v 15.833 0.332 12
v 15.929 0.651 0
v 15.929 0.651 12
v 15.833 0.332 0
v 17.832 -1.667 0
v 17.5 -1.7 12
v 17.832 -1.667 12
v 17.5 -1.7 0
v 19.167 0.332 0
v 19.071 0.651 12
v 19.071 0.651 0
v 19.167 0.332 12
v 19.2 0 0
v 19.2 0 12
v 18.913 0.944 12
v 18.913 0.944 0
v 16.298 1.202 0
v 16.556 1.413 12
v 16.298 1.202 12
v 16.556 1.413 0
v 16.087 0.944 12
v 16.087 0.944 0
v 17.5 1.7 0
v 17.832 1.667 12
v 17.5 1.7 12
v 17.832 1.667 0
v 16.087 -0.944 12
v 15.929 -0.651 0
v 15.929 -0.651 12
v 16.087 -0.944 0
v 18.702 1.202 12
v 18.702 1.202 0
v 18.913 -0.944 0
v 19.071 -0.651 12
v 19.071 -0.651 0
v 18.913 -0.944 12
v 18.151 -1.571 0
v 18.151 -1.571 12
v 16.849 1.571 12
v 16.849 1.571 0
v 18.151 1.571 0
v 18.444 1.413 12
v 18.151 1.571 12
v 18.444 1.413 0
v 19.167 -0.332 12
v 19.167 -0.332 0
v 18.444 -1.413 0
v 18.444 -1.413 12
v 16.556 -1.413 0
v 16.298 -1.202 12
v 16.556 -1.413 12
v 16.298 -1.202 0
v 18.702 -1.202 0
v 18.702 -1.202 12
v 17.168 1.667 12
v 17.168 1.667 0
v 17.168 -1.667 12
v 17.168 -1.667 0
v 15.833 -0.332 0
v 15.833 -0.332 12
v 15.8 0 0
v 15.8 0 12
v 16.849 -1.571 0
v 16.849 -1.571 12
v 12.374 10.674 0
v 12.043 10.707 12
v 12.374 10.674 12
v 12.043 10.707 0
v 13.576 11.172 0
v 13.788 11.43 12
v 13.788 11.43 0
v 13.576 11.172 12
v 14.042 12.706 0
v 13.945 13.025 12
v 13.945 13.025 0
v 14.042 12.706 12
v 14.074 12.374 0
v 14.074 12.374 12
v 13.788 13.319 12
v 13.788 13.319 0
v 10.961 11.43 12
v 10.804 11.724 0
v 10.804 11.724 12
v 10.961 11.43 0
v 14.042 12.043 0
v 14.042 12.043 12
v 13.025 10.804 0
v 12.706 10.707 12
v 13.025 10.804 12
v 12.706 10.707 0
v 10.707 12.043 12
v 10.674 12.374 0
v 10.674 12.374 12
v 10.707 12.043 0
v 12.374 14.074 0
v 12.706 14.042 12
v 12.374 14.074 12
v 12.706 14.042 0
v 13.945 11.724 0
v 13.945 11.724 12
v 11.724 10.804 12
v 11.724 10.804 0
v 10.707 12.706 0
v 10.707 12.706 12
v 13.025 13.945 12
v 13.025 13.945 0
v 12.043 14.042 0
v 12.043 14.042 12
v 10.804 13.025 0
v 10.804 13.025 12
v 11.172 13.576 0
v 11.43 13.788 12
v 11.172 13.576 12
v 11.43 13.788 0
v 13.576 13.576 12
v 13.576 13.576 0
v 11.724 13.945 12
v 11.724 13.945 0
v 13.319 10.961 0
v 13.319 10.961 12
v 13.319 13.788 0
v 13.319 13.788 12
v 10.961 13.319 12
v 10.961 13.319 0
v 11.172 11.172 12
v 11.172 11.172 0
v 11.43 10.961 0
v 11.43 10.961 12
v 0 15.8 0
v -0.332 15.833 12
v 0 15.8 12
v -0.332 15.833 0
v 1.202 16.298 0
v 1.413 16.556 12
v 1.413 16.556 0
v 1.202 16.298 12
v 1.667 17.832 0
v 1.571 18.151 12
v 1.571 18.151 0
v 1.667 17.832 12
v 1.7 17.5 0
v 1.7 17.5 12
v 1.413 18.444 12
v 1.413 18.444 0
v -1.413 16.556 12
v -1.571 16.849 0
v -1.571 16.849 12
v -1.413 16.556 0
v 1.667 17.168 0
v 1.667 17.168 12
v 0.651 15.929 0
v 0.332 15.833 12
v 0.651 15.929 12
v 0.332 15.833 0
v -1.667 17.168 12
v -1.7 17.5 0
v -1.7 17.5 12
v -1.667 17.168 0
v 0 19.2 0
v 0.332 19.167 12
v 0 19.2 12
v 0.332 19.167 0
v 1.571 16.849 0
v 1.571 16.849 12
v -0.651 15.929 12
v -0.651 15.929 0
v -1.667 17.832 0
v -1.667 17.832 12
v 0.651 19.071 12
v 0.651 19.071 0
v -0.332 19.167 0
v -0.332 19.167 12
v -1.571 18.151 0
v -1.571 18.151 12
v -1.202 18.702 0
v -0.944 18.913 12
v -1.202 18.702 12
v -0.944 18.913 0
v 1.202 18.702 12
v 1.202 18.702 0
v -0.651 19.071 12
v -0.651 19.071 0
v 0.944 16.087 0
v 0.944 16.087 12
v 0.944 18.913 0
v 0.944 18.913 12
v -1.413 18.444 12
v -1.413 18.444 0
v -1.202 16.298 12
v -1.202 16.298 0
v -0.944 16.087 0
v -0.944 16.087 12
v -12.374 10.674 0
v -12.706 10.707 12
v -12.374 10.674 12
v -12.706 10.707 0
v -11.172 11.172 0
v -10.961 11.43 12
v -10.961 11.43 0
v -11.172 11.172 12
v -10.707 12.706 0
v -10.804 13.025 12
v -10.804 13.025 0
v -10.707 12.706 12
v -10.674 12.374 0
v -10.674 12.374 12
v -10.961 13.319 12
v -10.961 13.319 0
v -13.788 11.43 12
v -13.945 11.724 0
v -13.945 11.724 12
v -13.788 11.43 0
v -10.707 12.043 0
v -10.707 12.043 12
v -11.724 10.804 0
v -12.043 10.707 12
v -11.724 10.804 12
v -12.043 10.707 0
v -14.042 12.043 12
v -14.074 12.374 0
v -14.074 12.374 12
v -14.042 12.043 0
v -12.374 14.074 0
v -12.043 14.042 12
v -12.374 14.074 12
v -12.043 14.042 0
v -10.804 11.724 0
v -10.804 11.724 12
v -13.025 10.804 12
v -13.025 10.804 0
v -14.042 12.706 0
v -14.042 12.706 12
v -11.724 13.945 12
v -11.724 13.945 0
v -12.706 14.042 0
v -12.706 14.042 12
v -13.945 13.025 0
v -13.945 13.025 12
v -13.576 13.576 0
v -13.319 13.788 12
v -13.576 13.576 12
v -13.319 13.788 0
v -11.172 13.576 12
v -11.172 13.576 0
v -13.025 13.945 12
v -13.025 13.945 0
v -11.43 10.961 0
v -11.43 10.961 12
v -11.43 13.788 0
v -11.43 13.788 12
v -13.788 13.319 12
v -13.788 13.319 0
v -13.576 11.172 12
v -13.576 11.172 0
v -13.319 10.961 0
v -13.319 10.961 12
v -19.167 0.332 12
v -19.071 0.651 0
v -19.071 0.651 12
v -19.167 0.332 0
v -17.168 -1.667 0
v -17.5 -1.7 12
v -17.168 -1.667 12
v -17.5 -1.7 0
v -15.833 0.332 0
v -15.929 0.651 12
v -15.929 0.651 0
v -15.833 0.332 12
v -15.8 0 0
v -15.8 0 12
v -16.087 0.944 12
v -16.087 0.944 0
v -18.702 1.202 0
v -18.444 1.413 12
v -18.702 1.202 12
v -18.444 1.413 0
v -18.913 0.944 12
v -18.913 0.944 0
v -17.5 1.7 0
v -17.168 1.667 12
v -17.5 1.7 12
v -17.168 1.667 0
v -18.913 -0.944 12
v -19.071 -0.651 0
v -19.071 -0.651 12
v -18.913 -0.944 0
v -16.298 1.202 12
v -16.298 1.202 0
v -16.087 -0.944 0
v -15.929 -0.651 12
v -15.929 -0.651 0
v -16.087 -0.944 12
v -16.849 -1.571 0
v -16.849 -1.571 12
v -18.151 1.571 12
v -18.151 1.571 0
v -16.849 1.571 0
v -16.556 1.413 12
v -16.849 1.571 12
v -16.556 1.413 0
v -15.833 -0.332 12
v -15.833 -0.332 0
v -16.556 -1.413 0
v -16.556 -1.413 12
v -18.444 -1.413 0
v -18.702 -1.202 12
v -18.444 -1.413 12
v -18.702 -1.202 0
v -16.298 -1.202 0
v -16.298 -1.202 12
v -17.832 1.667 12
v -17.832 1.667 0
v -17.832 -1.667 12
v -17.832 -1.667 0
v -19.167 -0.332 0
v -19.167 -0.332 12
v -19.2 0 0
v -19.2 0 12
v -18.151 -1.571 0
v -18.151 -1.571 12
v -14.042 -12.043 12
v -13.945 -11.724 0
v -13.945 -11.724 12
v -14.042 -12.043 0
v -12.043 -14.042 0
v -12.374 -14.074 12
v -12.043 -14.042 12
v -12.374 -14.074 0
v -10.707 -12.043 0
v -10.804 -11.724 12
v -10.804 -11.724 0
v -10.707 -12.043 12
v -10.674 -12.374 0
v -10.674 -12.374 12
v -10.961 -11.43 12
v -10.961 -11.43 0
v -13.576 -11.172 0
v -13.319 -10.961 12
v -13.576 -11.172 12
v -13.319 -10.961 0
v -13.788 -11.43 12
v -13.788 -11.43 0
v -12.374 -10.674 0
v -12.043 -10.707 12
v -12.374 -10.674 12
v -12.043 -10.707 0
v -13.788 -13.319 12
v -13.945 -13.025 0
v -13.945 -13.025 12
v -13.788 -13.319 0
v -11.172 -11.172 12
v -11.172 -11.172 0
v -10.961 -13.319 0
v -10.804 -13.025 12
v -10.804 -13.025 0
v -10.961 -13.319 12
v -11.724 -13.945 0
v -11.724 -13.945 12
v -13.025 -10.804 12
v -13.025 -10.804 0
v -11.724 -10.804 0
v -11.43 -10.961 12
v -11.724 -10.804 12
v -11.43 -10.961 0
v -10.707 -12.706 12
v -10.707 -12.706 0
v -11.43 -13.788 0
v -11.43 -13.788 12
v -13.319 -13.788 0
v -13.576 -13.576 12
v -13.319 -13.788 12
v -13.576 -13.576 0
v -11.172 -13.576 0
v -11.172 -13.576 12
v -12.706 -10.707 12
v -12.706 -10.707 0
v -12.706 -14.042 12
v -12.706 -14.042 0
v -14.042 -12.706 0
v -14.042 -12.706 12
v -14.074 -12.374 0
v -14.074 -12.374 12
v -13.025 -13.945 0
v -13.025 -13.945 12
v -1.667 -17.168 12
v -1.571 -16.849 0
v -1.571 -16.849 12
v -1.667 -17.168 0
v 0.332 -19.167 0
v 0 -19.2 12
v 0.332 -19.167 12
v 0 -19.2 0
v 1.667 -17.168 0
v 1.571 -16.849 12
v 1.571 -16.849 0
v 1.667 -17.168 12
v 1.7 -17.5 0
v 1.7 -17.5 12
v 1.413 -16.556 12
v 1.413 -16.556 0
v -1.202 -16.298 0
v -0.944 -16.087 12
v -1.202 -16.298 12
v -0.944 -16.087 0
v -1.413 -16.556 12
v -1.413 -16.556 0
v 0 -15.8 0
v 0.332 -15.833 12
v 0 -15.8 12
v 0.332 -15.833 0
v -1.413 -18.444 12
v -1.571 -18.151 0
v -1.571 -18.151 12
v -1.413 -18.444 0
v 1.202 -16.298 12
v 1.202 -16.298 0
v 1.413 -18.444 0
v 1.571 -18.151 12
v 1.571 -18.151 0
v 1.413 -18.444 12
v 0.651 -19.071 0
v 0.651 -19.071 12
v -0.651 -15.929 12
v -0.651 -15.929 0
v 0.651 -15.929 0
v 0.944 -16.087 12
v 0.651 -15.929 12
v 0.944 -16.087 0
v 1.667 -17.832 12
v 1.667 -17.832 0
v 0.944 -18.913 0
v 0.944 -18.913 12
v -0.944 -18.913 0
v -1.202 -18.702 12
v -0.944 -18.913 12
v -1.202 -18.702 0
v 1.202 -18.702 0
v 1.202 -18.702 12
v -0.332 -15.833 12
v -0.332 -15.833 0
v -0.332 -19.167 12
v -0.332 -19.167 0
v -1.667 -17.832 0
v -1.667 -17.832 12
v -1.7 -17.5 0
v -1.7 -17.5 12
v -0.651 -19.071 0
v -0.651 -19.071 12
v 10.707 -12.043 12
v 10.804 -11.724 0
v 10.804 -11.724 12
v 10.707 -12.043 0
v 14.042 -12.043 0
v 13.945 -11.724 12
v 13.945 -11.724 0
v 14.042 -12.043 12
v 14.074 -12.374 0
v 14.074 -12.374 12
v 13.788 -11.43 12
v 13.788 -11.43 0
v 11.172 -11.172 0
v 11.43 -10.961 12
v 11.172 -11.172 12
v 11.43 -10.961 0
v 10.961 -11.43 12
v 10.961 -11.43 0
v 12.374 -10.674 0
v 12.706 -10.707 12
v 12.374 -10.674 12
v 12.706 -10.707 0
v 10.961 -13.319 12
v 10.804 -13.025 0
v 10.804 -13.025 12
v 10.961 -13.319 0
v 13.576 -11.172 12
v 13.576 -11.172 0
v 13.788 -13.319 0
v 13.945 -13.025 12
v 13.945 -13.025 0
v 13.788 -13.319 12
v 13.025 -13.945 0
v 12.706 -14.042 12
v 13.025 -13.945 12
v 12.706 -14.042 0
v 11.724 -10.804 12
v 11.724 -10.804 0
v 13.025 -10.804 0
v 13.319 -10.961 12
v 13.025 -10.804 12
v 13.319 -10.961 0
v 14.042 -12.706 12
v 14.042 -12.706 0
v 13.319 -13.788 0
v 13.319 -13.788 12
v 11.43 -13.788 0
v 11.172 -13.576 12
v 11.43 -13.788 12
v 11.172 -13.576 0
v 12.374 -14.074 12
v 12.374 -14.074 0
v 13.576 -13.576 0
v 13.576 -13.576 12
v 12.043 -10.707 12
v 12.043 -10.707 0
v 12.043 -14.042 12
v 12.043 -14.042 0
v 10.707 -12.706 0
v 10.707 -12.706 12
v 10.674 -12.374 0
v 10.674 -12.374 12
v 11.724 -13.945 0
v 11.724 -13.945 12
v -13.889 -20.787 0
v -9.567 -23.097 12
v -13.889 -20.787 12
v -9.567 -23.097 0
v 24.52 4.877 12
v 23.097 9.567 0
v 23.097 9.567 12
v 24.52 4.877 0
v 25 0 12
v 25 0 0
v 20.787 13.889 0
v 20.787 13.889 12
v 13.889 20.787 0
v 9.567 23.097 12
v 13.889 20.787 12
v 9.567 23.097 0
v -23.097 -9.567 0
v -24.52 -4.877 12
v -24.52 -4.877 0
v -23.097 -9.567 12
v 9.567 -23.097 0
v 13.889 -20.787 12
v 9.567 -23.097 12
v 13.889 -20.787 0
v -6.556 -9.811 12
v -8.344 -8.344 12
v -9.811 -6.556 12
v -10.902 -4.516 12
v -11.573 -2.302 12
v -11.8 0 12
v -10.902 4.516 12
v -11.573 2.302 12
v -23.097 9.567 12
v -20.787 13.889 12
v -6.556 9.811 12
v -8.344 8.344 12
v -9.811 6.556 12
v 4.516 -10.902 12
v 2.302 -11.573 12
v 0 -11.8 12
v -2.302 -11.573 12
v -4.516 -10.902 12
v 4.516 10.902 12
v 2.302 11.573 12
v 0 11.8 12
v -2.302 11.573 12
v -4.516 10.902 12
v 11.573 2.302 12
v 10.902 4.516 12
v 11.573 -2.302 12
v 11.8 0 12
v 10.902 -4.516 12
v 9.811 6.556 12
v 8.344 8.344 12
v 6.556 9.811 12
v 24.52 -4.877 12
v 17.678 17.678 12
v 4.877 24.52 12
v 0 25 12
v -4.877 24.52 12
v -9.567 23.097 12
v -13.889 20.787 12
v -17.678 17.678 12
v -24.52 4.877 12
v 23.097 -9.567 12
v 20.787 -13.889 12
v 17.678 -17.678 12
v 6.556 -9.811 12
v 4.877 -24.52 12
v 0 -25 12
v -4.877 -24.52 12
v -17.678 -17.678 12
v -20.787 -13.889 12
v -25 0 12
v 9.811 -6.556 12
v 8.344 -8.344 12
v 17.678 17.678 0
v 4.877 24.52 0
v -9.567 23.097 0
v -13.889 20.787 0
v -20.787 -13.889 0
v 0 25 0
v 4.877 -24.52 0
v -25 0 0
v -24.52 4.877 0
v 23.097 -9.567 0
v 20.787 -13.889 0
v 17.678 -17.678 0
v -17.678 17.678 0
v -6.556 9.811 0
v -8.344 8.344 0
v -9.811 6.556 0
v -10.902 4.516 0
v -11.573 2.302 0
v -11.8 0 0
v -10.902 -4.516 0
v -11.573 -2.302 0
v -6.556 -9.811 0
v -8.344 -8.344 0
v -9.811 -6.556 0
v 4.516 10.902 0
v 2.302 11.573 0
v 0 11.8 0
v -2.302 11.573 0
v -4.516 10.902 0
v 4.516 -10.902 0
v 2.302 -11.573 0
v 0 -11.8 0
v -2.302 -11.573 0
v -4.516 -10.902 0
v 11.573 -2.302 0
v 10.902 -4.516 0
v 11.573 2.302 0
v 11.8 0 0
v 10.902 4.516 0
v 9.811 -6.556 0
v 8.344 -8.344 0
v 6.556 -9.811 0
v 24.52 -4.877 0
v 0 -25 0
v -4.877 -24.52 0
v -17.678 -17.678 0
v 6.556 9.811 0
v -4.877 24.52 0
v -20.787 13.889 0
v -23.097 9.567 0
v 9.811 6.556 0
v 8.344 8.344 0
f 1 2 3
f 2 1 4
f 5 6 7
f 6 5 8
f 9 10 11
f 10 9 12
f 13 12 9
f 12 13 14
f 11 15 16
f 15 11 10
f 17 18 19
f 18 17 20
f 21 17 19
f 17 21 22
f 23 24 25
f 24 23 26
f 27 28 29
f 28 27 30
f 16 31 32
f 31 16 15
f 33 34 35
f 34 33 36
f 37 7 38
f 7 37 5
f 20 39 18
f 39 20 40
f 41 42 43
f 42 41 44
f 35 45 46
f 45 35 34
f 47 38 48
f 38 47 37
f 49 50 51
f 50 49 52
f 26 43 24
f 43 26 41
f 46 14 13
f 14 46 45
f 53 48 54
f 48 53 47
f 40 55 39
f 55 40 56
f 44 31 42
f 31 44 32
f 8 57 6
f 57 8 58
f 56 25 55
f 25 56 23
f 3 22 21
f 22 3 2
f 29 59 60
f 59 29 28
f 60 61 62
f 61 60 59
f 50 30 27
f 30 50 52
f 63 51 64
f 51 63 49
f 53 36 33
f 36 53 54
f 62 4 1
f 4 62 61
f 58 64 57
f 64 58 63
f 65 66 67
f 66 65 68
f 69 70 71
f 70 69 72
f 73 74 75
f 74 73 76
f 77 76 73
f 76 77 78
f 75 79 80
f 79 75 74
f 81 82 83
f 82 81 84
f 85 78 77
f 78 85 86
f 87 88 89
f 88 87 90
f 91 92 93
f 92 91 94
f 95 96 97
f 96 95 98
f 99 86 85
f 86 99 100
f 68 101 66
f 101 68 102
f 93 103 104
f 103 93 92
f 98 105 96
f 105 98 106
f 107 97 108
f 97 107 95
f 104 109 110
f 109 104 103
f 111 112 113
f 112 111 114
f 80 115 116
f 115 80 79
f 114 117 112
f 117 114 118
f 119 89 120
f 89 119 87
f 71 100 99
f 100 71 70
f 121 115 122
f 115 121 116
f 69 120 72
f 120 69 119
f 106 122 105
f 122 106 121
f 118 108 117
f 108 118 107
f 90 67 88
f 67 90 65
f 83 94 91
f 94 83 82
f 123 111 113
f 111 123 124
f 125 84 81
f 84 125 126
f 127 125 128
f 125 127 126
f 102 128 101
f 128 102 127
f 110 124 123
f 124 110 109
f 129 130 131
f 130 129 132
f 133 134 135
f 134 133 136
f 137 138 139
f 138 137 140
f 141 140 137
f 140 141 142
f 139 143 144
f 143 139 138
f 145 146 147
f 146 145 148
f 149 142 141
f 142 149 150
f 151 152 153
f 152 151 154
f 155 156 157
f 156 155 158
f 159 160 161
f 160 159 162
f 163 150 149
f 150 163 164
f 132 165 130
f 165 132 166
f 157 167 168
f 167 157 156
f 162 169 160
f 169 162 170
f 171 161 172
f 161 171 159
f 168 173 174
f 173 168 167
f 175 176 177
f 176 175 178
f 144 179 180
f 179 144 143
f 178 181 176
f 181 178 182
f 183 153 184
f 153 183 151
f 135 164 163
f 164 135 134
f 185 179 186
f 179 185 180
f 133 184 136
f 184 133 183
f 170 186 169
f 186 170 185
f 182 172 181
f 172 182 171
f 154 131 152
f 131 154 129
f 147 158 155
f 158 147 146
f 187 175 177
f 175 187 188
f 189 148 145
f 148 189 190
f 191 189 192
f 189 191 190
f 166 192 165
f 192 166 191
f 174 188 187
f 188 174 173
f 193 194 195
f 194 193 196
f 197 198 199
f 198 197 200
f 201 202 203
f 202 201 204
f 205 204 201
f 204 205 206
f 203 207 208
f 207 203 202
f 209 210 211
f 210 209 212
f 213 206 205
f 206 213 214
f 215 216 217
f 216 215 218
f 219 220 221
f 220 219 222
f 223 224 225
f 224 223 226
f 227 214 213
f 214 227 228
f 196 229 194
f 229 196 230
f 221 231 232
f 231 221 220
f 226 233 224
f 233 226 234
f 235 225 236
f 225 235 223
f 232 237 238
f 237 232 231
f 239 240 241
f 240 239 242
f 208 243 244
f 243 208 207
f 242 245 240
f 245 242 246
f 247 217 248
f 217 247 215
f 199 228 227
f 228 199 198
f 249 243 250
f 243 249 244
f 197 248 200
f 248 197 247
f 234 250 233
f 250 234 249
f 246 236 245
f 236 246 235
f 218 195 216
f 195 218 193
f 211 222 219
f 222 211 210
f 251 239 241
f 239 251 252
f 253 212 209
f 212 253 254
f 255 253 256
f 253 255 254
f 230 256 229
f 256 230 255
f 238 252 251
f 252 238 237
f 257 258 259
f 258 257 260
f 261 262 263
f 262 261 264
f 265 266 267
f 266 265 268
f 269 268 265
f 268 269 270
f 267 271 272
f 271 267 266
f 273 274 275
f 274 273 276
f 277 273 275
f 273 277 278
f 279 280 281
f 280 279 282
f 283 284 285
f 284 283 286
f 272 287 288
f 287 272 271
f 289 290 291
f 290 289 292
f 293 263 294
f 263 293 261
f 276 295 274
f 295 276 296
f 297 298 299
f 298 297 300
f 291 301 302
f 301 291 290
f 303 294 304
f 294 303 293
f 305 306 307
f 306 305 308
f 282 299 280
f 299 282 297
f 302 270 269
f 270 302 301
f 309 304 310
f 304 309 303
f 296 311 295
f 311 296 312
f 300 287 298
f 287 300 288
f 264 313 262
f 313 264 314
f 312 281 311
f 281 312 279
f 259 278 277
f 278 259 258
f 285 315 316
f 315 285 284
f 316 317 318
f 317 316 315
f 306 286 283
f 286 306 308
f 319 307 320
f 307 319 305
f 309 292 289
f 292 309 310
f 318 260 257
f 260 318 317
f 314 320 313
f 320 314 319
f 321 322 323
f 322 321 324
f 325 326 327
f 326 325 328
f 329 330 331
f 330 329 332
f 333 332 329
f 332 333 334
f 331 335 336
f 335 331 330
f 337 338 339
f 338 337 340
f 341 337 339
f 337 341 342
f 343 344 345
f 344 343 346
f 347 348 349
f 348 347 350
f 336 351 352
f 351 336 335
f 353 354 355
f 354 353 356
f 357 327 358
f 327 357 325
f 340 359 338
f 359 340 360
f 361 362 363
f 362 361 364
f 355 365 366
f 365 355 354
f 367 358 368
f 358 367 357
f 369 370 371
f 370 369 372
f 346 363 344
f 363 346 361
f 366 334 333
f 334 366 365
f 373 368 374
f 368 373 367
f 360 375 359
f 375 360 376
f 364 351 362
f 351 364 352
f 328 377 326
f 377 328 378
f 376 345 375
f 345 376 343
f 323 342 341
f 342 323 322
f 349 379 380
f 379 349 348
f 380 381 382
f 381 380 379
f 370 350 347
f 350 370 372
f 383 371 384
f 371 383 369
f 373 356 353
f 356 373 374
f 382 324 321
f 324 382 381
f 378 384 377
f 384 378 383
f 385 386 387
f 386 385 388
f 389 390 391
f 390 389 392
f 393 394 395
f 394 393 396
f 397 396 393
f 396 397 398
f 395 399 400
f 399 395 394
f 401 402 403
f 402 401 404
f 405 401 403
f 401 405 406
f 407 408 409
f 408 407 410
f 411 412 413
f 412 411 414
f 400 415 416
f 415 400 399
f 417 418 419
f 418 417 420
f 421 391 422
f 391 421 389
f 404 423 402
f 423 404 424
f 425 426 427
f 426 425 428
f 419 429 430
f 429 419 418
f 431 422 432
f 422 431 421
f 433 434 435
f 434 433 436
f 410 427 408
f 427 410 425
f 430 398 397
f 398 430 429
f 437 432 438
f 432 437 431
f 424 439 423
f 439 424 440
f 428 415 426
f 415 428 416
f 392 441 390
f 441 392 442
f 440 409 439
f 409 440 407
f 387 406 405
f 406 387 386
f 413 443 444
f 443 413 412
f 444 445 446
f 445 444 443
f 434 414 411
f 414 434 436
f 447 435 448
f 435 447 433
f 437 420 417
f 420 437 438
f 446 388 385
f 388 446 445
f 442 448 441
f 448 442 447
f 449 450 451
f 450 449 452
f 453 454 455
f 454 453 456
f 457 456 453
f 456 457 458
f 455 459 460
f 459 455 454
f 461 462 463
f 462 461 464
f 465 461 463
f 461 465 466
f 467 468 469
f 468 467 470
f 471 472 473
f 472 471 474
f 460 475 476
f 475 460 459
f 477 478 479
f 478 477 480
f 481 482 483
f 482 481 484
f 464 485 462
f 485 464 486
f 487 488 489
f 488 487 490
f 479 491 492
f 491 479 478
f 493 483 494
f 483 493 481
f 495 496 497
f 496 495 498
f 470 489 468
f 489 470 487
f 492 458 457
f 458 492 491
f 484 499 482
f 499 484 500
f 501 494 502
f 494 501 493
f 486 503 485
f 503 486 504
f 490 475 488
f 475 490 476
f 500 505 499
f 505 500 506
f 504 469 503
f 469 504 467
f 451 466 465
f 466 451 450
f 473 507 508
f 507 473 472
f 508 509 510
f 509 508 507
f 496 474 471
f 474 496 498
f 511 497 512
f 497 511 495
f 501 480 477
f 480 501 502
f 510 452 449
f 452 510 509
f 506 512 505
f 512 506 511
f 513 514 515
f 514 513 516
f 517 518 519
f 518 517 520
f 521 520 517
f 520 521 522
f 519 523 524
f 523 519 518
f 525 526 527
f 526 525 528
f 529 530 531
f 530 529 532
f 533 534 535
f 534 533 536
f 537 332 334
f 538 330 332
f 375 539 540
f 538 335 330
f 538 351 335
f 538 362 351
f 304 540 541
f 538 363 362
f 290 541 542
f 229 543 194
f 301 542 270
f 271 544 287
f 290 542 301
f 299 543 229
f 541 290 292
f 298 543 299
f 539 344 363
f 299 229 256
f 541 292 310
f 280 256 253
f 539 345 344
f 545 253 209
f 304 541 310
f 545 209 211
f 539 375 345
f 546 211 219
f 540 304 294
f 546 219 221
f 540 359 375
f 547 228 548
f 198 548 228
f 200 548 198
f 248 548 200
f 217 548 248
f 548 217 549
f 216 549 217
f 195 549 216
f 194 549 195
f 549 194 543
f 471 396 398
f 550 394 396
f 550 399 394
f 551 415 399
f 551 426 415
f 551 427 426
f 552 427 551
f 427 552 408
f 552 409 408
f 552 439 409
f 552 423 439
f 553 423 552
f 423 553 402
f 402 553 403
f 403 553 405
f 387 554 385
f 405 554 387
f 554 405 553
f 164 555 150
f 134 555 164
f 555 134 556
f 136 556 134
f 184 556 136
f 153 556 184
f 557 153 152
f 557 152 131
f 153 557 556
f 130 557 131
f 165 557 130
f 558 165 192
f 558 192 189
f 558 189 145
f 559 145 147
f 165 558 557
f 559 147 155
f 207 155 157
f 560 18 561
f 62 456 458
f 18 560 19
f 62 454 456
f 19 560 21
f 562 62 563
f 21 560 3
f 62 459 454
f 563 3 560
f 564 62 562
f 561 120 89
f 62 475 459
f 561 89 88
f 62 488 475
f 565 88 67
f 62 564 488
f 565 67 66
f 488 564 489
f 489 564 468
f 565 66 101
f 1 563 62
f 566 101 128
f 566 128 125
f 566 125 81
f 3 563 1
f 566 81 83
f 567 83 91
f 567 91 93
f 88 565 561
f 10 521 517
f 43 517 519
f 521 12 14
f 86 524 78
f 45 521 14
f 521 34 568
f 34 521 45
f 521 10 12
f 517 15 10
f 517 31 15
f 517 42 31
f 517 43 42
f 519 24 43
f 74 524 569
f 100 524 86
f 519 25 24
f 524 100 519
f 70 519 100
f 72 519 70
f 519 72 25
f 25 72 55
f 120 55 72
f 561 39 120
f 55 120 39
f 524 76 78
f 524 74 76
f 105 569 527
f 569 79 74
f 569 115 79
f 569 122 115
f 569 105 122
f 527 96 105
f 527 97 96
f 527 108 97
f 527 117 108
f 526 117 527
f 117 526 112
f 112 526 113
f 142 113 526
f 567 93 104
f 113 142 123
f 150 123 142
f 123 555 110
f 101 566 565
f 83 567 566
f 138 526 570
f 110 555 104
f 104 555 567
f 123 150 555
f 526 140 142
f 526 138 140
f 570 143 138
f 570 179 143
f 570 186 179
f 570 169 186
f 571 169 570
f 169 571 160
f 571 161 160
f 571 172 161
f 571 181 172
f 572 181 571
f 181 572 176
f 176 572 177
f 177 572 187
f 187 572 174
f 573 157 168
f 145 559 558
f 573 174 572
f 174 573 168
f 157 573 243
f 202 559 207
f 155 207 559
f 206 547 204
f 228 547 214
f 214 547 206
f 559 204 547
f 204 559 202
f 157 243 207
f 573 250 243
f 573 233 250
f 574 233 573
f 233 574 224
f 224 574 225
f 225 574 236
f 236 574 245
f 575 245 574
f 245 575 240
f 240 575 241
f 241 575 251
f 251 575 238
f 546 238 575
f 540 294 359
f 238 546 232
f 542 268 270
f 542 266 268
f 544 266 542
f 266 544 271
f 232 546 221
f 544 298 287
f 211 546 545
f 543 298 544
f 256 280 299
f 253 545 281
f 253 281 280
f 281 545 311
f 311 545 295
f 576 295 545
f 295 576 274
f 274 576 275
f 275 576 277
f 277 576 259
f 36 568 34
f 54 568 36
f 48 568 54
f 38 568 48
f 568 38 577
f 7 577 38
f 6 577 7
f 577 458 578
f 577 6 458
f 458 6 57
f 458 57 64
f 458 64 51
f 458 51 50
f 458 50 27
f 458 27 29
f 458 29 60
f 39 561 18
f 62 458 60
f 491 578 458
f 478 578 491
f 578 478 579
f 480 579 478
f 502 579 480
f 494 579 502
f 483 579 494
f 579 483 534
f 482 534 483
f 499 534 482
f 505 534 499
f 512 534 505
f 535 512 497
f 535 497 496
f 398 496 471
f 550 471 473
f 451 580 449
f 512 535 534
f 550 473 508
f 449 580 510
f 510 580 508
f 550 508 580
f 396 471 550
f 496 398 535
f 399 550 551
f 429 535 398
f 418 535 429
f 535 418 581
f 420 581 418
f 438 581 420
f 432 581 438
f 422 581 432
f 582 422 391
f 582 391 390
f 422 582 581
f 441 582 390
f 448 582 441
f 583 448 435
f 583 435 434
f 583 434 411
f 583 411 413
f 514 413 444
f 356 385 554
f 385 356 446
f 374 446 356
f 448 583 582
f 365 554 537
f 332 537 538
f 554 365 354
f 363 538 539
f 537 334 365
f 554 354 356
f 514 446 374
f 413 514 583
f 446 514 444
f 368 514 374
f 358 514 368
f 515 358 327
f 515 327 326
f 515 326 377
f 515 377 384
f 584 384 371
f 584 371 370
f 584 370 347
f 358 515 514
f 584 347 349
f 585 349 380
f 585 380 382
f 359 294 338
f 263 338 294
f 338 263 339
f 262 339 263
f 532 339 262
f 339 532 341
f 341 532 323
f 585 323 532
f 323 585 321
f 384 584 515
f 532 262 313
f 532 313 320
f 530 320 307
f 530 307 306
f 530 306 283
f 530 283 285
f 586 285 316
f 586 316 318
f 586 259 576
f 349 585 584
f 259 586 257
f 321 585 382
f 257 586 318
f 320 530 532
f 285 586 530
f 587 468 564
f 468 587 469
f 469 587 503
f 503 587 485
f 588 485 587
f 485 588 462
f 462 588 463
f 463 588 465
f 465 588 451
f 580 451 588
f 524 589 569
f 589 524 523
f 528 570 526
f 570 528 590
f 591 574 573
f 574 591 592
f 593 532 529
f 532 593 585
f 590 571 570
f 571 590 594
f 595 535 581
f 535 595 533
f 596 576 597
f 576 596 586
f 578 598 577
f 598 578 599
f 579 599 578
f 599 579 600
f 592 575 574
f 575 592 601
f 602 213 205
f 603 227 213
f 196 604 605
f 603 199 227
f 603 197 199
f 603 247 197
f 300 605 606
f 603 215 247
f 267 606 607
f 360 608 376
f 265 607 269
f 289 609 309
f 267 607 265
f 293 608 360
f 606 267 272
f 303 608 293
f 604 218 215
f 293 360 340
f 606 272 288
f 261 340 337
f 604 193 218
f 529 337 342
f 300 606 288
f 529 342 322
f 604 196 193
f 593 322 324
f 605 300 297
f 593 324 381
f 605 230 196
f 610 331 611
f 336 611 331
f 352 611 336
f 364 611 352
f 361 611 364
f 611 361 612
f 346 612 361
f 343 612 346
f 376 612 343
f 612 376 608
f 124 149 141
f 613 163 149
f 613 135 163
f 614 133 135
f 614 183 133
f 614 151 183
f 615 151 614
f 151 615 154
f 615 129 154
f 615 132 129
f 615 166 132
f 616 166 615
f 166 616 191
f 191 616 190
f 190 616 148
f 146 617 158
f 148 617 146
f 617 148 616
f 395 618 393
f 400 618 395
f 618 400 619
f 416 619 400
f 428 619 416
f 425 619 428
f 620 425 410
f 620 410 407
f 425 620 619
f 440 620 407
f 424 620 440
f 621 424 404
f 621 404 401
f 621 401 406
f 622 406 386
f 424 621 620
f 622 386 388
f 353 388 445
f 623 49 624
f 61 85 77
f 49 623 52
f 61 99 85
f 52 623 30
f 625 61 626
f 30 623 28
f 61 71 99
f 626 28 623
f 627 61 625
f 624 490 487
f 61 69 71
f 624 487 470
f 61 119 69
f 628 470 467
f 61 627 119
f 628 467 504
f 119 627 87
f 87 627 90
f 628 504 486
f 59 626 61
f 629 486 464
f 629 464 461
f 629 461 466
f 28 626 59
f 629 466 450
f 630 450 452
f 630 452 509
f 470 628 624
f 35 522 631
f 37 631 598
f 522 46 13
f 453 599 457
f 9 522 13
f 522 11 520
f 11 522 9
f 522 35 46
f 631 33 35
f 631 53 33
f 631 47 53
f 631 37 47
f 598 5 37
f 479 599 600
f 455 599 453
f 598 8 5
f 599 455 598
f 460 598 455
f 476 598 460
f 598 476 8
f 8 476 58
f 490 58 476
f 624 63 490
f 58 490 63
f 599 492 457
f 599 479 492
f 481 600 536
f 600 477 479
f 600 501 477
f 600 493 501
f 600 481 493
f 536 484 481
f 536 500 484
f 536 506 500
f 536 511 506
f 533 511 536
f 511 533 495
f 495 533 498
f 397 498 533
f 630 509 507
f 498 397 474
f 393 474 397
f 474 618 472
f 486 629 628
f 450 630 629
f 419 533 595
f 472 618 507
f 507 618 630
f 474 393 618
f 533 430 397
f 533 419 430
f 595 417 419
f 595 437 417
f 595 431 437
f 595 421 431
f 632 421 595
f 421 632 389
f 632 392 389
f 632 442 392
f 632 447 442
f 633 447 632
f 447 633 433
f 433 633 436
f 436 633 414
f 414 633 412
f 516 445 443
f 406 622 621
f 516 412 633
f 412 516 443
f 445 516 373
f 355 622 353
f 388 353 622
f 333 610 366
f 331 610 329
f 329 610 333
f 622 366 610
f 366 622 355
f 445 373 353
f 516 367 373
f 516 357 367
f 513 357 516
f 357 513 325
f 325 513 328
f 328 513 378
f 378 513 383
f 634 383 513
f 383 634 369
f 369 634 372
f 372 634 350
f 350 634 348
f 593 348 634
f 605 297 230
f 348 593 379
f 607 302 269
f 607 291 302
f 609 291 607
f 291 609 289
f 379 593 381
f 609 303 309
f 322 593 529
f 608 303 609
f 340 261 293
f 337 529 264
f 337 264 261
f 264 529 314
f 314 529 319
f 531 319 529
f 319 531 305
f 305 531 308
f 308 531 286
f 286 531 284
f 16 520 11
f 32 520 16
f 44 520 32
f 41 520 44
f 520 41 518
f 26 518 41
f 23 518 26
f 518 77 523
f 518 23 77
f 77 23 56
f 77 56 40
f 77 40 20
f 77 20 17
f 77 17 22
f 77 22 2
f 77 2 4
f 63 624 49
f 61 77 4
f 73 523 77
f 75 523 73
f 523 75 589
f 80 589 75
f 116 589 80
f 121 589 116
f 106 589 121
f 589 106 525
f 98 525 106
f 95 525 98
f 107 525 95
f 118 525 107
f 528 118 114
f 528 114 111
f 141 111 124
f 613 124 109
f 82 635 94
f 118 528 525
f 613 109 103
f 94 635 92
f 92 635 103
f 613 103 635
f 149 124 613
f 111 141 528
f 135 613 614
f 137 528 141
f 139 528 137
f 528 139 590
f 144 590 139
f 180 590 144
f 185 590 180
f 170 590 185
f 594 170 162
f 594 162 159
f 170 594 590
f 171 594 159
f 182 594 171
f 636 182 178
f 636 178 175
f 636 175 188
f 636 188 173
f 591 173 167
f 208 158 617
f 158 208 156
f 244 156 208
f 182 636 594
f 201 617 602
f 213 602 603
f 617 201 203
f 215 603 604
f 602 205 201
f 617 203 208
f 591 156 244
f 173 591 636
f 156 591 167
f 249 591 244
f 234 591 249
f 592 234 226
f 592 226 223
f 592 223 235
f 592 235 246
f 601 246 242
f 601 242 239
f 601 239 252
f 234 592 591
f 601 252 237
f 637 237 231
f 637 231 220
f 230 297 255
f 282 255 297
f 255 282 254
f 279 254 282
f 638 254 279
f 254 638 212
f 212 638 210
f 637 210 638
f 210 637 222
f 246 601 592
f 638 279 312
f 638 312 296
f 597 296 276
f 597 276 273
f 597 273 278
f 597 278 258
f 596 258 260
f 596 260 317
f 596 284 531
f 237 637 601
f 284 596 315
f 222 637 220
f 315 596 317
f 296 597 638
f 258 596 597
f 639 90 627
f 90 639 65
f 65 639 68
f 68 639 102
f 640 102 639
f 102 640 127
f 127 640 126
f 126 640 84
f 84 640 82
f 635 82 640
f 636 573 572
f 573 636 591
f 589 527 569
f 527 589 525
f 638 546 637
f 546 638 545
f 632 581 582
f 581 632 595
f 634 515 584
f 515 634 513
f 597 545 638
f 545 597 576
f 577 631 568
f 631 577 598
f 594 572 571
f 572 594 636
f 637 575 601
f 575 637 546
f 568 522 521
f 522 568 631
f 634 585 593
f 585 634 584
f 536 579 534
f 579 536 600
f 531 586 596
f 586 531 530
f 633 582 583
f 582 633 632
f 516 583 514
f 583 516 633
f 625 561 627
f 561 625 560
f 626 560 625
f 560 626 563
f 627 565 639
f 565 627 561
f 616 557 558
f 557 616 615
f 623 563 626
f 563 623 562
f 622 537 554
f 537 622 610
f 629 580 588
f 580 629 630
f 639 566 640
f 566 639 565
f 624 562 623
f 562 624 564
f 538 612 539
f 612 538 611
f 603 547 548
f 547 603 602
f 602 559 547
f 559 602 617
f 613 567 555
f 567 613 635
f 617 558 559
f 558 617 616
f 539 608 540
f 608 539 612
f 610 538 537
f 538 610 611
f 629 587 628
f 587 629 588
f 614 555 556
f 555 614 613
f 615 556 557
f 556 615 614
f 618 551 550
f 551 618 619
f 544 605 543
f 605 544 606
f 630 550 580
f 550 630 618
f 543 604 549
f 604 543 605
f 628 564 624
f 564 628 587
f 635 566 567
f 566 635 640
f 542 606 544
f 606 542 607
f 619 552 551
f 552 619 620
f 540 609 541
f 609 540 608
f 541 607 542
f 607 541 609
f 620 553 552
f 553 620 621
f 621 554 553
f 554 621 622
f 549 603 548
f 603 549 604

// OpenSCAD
$fn = 32;

// ----------------------------------------------------------------------
// Flange Ø50 x 12
// 8 holes on a Ø35 bolt circle, bolted joints
// ----------------------------------------------------------------------

// --- parameters (mm) ---
flange_d = 50;   // outside diameter of the flange
thickness = 12;  // flange thickness
holes = 8;       // number of bolt holes
pcd = 35;        // bolt circle diameter
start_deg = 0;   // angle of the first hole, from +X
hole_d = 3.4;    // bolt hole diameter
bore_d = 23.6;   // central through bore
hub_d = 35.6;    // hub outside diameter
hub_h = 0;       // hub height above the flange face (0 = no hub)

// --- derived feature positions (mm) ---
height = thickness + hub_h;  // = 12   overall height of the part
pcd_r = pcd / 2;             // = 17.5   bolt circle radius
hole_step = 360 / holes;     // = 45   angular pitch
feature_centers = [
  [pcd_r * cos(start_deg + 0 * hole_step), pcd_r * sin(start_deg + 0 * hole_step)],
  [pcd_r * cos(start_deg + 1 * hole_step), pcd_r * sin(start_deg + 1 * hole_step)],
  [pcd_r * cos(start_deg + 2 * hole_step), pcd_r * sin(start_deg + 2 * hole_step)],
  [pcd_r * cos(start_deg + 3 * hole_step), pcd_r * sin(start_deg + 3 * hole_step)],
  [pcd_r * cos(start_deg + 4 * hole_step), pcd_r * sin(start_deg + 4 * hole_step)],
  [pcd_r * cos(start_deg + 5 * hole_step), pcd_r * sin(start_deg + 5 * hole_step)],
  [pcd_r * cos(start_deg + 6 * hole_step), pcd_r * sin(start_deg + 6 * hole_step)],
  [pcd_r * cos(start_deg + 7 * hole_step), pcd_r * sin(start_deg + 7 * hole_step)]
];   // bolt hole centres on the pitch circle

// flange disc, every hole and the bore cut straight through
difference() {
  union() {
    cylinder(d = flange_d, h = thickness);
  }
  translate([0, 0, -1]) cylinder(d = bore_d, h = height + 2);  // bore, through
  for (centre = feature_centers)
    translate([centre[0], centre[1], -1]) cylinder(d = hole_d, h = thickness + 2);
}
